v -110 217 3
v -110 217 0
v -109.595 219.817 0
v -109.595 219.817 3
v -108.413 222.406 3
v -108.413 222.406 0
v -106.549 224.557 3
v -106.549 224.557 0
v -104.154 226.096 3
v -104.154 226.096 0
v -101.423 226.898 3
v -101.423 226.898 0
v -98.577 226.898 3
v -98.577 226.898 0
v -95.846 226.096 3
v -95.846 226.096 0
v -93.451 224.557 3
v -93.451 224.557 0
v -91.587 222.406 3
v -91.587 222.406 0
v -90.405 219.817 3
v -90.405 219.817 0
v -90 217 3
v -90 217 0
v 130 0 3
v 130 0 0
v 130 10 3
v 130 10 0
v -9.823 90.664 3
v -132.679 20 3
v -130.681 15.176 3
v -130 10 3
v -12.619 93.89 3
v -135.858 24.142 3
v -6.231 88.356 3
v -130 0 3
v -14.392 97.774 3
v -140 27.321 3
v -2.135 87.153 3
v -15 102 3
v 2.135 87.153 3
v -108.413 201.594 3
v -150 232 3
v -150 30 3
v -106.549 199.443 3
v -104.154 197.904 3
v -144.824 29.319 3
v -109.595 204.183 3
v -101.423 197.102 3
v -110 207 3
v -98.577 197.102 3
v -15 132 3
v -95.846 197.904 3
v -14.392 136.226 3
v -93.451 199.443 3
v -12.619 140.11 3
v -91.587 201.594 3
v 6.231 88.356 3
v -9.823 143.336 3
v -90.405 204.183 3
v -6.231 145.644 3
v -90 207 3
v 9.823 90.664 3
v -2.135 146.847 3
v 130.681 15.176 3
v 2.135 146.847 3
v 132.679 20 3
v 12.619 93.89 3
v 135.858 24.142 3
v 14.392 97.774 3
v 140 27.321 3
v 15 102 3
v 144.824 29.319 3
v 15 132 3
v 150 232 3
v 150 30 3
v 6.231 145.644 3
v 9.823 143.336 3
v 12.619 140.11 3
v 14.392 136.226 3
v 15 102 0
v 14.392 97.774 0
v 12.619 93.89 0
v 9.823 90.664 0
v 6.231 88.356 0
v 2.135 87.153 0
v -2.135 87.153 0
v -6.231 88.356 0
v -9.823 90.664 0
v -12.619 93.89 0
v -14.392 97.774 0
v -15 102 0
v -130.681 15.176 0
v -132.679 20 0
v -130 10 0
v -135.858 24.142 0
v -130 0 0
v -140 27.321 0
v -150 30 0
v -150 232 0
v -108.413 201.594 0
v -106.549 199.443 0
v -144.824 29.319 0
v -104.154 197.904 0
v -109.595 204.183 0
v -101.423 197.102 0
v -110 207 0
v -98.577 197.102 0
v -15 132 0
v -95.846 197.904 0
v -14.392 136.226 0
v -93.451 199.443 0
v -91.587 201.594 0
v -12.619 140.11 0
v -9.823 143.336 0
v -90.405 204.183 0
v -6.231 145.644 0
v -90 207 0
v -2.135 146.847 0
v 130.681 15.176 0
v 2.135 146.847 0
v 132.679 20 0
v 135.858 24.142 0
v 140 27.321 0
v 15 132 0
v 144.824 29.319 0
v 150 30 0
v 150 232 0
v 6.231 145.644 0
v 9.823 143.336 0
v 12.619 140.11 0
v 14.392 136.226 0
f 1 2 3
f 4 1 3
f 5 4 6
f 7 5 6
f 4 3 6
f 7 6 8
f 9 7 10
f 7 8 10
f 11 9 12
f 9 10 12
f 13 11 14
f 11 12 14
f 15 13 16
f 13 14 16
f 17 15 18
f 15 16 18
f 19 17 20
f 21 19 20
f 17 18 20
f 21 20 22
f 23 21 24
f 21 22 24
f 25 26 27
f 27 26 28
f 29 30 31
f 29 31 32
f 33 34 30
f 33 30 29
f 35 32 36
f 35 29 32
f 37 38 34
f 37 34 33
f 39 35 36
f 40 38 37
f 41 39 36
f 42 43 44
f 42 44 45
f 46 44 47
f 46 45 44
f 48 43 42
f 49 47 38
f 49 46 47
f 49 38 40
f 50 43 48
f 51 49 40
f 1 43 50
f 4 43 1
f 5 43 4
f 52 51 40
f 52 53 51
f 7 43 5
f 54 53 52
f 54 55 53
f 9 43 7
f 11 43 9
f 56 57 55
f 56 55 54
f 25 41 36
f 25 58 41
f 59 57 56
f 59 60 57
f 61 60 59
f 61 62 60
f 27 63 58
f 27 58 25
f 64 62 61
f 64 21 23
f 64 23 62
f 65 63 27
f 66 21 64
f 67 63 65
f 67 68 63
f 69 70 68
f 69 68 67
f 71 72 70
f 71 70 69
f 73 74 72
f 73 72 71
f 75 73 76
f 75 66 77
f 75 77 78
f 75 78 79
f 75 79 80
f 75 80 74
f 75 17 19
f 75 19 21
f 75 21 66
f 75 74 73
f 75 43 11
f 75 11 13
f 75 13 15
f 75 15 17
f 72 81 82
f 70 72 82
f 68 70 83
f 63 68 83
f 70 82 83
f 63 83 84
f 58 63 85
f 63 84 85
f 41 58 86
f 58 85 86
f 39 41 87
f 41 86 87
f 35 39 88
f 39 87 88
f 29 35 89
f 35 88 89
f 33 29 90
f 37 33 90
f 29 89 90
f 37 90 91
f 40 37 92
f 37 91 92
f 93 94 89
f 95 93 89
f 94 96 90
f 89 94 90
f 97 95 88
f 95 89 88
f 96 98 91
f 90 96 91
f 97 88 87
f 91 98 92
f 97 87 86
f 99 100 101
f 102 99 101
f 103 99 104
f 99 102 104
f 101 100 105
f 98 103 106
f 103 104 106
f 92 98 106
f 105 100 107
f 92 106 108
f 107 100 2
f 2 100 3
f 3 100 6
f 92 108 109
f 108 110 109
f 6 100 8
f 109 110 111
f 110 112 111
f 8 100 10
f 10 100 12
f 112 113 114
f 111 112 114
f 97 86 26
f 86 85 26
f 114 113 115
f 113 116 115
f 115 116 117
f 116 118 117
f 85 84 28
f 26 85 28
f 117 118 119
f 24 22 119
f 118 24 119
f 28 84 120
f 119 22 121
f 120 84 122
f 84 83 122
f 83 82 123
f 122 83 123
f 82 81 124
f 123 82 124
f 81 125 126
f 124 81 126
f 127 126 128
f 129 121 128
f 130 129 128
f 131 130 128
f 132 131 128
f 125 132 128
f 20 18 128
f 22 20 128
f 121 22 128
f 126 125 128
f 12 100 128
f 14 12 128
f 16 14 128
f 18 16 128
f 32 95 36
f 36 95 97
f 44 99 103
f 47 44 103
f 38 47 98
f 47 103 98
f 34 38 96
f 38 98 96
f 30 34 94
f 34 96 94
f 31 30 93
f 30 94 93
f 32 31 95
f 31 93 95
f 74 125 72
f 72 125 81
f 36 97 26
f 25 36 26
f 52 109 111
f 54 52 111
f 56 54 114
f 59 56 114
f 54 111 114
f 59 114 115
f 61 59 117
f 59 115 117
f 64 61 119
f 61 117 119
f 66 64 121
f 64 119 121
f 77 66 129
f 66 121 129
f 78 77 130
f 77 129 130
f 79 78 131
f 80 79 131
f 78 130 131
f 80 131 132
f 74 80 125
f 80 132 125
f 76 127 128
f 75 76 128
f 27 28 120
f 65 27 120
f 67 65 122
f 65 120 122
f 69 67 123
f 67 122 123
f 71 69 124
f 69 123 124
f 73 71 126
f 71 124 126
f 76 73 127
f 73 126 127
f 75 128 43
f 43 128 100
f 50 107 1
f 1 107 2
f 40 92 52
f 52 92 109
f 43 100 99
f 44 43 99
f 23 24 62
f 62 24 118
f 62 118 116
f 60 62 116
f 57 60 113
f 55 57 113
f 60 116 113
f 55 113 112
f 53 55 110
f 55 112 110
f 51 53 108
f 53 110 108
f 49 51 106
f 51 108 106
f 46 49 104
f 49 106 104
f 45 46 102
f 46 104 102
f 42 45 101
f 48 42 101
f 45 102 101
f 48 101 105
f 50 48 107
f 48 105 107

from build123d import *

# Parameters (mm, degrees)
EXTRUSION1_DEPTH = 3


with BuildPart() as part:
    # Esquisse1 → Extrusion1 (new body)
    with BuildSketch(Plane.XY):
        with BuildLine():
            Line((150, 232), (-150, 232))
            Line((-150, 232), (-150, 30))
            ThreePointArc((-150, 30), (-135.857864376, 24.142135624), (-130, 10))
            Line((-130, 10), (-130, 0))
            Line((-130, 0), (130, 0))
            Line((130, 0), (130, 10))
            ThreePointArc((130, 10), (135.857864376, 24.142135624), (150, 30))
            Line((150, 30), (150, 232))
        make_face()
        with BuildLine():
            Line((-15, 102), (-15, 132))
            ThreePointArc((-15, 132), (0, 147), (15, 132))
            Line((15, 132), (15, 102))
            ThreePointArc((15, 102), (0, 87), (-15, 102))
        make_face(mode=Mode.SUBTRACT)
        with BuildLine():
            Line((-110, 207), (-110, 217))
            ThreePointArc((-110, 217), (-100, 227), (-90, 217))
            Line((-90, 217), (-90, 207))
            ThreePointArc((-90, 207), (-100, 197), (-110, 207))
        make_face(mode=Mode.SUBTRACT)
    extrude(amount=EXTRUSION1_DEPTH)


solid = part.part
